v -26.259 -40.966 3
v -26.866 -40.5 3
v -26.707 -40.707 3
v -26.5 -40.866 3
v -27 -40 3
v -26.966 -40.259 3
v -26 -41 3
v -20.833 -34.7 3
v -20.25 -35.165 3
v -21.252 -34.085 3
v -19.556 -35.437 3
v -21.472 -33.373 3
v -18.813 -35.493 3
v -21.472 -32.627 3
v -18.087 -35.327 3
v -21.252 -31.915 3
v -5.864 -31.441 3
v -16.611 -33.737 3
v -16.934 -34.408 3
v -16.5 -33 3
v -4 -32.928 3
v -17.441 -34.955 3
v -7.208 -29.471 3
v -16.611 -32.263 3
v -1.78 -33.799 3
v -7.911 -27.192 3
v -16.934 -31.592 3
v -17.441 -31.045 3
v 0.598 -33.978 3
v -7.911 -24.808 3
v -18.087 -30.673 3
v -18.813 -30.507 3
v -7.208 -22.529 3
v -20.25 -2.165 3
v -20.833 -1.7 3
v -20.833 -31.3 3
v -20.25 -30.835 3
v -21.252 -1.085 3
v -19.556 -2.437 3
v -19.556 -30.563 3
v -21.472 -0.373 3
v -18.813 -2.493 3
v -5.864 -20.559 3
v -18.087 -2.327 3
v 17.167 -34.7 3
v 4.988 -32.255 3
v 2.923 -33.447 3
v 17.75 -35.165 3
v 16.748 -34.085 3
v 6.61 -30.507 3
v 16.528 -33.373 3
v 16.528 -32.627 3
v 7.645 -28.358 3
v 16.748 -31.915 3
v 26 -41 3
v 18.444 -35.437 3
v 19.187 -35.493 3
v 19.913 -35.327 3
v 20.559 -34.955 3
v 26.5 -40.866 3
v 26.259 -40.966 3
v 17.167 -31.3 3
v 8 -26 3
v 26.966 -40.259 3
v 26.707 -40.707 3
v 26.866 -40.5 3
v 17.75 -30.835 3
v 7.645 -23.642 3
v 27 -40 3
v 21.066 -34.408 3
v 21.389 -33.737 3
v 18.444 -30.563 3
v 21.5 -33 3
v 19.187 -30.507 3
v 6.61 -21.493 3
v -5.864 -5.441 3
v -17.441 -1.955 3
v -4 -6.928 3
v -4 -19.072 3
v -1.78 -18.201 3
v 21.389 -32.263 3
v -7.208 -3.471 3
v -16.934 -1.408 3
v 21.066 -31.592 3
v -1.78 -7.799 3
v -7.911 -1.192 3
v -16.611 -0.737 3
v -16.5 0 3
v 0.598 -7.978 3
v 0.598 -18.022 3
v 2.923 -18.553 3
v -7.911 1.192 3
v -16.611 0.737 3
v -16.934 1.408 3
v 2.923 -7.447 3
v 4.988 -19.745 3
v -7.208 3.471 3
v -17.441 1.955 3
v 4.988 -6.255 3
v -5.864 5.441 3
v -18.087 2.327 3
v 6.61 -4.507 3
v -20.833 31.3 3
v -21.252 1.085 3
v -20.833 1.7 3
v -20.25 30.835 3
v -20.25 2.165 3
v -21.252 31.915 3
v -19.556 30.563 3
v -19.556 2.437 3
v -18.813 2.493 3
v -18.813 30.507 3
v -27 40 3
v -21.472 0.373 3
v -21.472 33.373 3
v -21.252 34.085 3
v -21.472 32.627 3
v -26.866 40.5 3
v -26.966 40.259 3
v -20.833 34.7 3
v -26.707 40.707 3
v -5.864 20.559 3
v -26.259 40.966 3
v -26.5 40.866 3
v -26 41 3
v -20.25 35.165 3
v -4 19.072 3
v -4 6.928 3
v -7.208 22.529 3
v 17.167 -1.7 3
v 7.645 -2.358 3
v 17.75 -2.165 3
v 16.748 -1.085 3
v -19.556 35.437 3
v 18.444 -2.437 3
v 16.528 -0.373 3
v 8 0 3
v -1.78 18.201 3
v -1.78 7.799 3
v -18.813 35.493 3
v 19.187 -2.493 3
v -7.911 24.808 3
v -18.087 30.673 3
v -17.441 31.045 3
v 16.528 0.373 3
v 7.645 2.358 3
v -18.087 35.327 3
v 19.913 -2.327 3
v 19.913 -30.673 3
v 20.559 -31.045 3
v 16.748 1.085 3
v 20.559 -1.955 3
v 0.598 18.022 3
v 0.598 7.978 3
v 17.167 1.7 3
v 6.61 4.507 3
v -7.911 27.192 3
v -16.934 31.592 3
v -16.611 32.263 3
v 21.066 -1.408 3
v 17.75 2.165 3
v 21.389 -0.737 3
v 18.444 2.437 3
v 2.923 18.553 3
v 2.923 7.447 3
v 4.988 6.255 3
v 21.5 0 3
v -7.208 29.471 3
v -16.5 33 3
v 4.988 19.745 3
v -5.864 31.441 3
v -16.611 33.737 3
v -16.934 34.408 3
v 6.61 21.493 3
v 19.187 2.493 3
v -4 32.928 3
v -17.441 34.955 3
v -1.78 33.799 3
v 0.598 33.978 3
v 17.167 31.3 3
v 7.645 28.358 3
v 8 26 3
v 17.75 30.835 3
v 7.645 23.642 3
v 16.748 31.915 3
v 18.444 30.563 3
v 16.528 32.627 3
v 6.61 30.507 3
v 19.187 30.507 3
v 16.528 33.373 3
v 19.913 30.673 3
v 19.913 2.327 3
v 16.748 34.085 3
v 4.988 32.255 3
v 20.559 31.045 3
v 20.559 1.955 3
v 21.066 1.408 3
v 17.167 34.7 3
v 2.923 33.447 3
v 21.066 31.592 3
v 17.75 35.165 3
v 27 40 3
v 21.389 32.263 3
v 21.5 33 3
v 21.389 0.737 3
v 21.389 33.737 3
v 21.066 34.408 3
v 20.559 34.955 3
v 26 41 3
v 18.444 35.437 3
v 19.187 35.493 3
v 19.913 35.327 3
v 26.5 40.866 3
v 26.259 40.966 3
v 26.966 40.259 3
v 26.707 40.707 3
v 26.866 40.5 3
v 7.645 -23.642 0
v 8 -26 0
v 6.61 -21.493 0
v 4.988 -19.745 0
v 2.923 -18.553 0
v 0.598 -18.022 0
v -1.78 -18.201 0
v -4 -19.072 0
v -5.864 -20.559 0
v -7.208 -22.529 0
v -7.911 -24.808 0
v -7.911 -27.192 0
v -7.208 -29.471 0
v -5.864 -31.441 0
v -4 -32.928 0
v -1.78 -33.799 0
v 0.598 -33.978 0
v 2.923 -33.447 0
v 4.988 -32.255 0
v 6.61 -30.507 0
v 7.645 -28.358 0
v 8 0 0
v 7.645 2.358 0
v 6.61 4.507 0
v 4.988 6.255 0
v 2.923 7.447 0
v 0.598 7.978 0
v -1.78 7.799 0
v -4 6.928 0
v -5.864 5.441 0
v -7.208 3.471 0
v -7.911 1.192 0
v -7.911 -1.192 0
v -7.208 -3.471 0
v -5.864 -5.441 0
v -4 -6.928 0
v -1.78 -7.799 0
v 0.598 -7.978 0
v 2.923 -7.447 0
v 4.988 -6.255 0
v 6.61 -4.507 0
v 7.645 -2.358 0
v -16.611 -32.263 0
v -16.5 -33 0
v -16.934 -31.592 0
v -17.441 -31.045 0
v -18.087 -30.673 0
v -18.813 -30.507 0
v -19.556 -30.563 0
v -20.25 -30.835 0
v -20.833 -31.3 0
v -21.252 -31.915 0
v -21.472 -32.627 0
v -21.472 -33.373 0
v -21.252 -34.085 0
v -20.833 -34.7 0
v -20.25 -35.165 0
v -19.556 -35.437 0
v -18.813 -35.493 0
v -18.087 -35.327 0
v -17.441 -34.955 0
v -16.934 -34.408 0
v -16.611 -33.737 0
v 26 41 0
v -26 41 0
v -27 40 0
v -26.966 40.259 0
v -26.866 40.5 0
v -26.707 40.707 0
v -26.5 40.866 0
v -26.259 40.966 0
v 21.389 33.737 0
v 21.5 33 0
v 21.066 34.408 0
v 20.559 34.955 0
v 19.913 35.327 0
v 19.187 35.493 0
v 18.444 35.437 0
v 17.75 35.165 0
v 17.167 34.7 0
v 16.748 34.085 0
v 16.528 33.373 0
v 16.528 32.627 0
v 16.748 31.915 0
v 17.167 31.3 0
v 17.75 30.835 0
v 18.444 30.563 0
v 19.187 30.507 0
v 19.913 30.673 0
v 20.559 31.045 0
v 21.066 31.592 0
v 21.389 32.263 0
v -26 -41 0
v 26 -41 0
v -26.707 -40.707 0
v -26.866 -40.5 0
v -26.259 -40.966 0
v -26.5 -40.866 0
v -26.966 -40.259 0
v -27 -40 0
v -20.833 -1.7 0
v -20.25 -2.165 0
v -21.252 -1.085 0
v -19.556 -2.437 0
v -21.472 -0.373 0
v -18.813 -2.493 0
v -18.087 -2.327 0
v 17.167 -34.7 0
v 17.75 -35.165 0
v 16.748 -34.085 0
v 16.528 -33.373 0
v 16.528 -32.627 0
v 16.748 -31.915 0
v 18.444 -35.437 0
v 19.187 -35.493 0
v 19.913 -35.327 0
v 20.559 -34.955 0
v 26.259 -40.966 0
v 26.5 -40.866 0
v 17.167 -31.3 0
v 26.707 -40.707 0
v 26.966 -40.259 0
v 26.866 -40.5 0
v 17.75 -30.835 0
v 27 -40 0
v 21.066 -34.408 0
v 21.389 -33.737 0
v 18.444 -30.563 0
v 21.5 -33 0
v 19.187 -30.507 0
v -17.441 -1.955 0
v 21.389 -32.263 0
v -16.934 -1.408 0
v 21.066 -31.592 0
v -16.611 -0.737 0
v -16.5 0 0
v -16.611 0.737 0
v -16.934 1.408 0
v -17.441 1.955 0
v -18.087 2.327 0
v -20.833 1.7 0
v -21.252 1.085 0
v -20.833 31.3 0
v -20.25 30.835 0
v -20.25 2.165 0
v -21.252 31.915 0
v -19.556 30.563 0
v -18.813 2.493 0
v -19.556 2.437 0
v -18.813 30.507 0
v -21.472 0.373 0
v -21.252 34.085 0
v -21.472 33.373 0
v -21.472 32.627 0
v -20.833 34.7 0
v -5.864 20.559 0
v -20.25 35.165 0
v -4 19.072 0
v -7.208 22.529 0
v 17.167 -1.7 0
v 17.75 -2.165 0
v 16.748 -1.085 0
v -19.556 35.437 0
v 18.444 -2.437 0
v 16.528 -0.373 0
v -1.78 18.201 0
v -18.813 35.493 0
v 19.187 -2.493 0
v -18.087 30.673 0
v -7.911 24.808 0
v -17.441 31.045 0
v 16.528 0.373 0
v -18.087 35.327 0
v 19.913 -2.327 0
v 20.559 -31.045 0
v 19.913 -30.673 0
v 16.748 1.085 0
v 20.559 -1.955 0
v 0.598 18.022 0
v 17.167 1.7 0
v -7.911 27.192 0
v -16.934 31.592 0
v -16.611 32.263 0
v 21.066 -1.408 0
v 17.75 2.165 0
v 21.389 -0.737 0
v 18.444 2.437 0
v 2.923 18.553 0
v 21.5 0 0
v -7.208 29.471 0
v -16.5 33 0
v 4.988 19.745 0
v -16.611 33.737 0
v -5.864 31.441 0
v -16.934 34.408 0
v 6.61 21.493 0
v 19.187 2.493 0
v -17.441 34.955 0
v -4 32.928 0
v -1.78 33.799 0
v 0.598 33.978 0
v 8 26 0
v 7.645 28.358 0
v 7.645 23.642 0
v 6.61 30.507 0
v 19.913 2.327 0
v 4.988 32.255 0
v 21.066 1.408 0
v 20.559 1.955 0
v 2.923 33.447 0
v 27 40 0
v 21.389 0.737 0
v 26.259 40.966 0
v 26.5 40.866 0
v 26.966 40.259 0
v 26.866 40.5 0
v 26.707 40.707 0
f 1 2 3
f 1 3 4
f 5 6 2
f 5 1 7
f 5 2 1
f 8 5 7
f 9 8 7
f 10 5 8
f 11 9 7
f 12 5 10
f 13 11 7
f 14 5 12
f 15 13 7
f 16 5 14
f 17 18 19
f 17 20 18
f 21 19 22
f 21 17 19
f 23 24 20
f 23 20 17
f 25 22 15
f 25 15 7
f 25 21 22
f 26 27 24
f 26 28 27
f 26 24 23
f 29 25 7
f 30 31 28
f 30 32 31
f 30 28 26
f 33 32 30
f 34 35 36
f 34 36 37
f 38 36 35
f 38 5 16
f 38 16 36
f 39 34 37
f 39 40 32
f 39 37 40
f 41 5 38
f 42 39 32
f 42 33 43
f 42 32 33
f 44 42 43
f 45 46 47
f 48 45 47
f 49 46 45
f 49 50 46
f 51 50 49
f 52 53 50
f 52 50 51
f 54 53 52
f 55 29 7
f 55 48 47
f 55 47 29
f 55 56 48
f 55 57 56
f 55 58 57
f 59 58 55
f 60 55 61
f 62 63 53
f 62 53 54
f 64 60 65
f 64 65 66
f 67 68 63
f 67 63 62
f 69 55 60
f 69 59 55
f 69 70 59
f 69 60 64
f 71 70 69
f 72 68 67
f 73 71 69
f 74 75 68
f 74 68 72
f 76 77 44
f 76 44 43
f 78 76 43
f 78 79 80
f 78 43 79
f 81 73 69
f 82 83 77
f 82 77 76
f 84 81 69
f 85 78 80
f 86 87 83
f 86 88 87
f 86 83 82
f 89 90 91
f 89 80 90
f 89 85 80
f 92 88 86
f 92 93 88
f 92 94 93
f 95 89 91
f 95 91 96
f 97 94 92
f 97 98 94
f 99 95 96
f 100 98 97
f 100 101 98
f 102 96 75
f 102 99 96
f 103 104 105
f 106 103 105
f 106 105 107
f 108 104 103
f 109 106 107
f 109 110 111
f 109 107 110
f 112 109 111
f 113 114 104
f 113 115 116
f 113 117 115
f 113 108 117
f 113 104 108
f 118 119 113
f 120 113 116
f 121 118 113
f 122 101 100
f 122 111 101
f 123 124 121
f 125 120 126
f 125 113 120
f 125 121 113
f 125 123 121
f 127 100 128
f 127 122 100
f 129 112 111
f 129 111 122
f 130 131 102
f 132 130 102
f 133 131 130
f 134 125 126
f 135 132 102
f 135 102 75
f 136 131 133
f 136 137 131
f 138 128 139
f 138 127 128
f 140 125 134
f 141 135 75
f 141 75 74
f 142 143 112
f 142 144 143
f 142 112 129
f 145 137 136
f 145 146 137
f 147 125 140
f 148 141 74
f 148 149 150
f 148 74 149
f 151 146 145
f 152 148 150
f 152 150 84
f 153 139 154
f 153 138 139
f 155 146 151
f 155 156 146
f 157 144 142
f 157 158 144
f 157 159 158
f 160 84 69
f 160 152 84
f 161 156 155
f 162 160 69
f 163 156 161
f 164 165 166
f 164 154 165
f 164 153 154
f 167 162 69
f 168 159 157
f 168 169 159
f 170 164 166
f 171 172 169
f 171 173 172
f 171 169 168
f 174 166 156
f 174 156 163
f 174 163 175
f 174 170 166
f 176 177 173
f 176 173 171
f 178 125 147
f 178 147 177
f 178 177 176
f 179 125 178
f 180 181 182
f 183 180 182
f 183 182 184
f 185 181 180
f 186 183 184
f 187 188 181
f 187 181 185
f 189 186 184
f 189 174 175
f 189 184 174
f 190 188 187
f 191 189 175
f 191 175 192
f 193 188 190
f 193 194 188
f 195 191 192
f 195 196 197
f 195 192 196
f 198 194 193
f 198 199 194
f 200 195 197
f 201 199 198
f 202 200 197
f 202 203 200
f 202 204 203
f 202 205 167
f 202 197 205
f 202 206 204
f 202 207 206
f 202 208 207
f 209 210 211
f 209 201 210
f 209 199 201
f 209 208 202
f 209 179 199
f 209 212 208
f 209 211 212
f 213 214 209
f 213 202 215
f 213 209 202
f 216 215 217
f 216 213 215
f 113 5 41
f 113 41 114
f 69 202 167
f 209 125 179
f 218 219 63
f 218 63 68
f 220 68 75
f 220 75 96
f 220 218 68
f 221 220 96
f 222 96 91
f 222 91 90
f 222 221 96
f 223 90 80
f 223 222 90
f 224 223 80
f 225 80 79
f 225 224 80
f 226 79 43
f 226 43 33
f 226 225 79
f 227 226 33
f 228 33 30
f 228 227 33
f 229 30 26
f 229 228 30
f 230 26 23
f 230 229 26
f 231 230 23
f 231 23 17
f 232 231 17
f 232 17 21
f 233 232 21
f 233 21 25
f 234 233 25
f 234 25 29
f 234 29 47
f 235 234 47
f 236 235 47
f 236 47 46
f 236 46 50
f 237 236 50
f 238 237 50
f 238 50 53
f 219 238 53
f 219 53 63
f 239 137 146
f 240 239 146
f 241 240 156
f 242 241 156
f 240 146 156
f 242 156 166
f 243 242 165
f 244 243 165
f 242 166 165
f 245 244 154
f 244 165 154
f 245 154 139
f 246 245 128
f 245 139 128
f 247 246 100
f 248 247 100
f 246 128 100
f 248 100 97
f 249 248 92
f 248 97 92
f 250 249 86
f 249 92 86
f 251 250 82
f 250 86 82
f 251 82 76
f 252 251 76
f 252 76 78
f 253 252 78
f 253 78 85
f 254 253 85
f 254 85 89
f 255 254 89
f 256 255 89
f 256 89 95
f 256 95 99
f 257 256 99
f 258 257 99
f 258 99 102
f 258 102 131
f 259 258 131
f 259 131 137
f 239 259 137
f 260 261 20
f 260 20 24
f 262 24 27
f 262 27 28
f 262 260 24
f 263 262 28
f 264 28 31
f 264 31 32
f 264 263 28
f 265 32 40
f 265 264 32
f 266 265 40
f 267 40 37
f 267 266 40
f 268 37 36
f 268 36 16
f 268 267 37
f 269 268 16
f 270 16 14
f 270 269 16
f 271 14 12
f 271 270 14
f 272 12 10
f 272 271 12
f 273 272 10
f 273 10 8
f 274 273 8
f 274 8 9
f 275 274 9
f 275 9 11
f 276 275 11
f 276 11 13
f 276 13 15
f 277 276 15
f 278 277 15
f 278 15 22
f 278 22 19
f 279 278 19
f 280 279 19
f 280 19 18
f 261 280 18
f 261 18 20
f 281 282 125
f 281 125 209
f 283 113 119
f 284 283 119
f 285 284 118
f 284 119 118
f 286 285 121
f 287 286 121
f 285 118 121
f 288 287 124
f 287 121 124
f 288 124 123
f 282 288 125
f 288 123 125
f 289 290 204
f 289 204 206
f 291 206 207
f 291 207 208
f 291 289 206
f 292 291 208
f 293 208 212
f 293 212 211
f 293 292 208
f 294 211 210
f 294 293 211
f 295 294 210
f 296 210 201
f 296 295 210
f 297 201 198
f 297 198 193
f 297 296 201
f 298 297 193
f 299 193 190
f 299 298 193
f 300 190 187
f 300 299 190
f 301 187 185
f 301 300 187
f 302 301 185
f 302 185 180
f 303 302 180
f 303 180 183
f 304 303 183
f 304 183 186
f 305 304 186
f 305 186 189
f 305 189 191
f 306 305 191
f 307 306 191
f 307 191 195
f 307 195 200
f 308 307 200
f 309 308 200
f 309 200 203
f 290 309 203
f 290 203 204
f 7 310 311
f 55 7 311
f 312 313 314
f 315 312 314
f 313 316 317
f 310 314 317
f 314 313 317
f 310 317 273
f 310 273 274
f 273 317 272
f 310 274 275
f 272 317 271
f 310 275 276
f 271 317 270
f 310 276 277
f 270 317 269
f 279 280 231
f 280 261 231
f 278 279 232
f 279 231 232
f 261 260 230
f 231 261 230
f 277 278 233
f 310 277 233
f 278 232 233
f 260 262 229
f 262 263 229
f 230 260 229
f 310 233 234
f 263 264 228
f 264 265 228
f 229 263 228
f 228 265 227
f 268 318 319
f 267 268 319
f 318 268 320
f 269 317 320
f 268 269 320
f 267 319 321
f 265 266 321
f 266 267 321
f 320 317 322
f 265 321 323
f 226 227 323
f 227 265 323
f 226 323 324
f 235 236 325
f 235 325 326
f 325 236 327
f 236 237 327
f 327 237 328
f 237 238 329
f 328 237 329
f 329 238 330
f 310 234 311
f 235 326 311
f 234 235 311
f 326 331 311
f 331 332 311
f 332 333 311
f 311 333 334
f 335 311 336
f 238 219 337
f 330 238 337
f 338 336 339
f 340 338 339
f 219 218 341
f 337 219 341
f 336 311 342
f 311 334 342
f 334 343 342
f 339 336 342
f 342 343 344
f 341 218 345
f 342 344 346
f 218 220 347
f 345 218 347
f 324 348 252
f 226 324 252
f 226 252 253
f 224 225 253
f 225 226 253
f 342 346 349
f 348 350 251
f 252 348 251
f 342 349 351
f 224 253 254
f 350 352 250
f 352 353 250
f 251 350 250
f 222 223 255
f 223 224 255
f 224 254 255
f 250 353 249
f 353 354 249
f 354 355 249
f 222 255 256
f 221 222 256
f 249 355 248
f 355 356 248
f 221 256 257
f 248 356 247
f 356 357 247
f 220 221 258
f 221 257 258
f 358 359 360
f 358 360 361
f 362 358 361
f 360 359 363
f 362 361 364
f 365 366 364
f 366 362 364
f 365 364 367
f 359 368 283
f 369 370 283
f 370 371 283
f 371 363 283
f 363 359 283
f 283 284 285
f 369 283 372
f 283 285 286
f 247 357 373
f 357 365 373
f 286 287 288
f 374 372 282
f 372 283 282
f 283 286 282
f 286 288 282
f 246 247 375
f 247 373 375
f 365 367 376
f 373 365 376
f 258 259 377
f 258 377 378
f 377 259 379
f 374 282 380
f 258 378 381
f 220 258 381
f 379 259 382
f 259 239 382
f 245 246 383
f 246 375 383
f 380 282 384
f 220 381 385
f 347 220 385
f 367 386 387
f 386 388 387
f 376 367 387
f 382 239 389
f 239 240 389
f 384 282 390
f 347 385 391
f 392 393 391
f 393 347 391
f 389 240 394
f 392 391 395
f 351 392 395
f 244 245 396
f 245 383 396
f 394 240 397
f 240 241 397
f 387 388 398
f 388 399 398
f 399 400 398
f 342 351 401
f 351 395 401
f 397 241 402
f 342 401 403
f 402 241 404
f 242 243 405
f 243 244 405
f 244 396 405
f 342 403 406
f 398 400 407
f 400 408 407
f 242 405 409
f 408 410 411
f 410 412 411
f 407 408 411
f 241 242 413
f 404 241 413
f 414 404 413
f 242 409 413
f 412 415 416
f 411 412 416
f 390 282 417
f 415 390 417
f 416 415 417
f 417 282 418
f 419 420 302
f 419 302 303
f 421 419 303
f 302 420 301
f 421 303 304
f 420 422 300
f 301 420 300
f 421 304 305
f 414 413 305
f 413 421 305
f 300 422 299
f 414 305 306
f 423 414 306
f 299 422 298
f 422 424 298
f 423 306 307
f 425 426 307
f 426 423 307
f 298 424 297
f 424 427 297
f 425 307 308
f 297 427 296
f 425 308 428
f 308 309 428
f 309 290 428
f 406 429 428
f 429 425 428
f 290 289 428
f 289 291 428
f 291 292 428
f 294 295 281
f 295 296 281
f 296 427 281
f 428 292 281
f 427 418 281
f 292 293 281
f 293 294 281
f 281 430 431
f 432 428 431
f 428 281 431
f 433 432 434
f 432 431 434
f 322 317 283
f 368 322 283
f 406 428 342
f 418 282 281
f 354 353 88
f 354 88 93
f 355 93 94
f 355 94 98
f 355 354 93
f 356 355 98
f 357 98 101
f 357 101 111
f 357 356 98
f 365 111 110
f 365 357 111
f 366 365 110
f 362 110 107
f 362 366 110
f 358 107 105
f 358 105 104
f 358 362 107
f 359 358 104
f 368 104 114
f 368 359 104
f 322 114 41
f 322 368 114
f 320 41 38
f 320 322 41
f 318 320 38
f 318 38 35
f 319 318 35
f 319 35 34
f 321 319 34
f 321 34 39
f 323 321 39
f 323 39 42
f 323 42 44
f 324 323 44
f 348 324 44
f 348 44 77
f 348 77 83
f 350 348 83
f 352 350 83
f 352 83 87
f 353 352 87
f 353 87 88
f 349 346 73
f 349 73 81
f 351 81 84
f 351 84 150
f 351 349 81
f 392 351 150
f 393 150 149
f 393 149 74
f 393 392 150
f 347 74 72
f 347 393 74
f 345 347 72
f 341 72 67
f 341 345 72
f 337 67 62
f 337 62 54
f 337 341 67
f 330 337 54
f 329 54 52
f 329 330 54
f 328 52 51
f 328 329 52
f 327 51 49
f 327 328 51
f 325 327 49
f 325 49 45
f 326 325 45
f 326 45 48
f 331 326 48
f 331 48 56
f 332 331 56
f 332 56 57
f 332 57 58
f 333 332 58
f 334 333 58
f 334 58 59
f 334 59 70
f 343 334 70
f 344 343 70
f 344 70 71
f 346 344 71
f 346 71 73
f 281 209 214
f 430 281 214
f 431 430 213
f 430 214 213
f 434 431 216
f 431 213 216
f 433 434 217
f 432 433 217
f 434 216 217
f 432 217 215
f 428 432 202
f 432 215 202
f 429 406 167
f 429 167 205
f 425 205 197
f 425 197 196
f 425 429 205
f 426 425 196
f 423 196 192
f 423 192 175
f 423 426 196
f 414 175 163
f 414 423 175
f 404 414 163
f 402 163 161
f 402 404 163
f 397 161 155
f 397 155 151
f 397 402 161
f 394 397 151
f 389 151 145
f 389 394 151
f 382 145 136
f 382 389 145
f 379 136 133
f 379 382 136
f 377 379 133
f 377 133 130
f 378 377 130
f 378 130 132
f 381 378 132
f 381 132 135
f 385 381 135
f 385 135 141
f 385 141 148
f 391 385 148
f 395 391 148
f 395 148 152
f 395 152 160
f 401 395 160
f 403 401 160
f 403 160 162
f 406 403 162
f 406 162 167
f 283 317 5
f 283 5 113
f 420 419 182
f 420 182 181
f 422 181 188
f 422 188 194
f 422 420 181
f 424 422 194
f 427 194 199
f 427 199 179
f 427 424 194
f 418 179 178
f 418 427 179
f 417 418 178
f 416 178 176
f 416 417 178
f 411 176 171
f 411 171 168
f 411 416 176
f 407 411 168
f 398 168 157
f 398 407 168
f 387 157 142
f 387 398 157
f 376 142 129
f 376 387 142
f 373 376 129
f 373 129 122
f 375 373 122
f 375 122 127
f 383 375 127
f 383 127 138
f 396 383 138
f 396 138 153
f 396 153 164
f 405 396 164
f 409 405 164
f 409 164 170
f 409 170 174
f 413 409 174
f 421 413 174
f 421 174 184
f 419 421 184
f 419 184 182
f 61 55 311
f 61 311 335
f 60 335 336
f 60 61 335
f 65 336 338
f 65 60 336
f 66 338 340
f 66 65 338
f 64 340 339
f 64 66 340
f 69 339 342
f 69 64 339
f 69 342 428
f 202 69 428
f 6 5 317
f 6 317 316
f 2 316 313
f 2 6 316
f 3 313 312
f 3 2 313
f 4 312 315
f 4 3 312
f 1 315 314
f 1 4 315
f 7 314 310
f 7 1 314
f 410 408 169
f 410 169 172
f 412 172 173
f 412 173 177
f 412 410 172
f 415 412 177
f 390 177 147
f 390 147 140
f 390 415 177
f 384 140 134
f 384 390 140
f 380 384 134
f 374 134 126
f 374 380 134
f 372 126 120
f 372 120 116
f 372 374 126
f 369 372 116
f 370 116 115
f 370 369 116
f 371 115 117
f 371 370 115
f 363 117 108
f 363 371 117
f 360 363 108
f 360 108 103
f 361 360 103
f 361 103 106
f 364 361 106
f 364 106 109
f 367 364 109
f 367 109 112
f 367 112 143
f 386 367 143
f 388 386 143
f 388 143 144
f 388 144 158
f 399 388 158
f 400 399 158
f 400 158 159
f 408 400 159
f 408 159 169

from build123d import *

# Parameters (mm, degrees)
F0_W     = 54
F0_H     = 82
F0_R     = 2.5
F0_R_2   = 8
F1_DEPTH = 5
F2_R     = 1
F3_R     = 8
F4_DEPTH = 25
F5_DEPTH = 2


with BuildPart() as f1:
    # F0 (on Top) → F1 (new body)
    with BuildSketch(Plane.XY):
        Rectangle(F0_W, F0_H)
        with Locations((-19, -33)):
            Circle(F0_R, mode=Mode.SUBTRACT)
        with Locations((0, -26)):
            Circle(F0_R_2, mode=Mode.SUBTRACT)
        with Locations((19, -33)):
            Circle(F0_R, mode=Mode.SUBTRACT)
        with Locations((-19, 0)):
            Circle(F0_R, mode=Mode.SUBTRACT)
        with Locations((-19, 33)):
            Circle(F0_R, mode=Mode.SUBTRACT)
        with Locations((19, 0)):
            Circle(F0_R, mode=Mode.SUBTRACT)
        with Locations((0, 26)):
            Circle(F0_R_2, mode=Mode.SUBTRACT)
        with Locations((19, 33)):
            Circle(F0_R, mode=Mode.SUBTRACT)
    extrude(amount=F1_DEPTH)

    # F2
    f2_edges = [f1.edges().sort_by_distance(p)[0] for p in [
        (27, -41, 2.5),
        (-27, -41, 2.5),
        (-27, 41, 2.5),
        (27, 41, 2.5),
    ]]
    fillet(f2_edges, radius=F2_R)

    # F3 (on face) → F4 (cut)
    with BuildSketch(Plane.XY.offset(5)):
        Circle(F3_R)
    extrude(amount=-F4_DEPTH, mode=Mode.SUBTRACT)

    # F5 (cut): a face of the model
    f5_faces = [f1.faces().sort_by_distance(p)[0] for p in [
        (26.0181649833, 0, 5),
    ]]
    extrude(f5_faces, amount=-F5_DEPTH, mode=Mode.SUBTRACT)


solid = f1.part
